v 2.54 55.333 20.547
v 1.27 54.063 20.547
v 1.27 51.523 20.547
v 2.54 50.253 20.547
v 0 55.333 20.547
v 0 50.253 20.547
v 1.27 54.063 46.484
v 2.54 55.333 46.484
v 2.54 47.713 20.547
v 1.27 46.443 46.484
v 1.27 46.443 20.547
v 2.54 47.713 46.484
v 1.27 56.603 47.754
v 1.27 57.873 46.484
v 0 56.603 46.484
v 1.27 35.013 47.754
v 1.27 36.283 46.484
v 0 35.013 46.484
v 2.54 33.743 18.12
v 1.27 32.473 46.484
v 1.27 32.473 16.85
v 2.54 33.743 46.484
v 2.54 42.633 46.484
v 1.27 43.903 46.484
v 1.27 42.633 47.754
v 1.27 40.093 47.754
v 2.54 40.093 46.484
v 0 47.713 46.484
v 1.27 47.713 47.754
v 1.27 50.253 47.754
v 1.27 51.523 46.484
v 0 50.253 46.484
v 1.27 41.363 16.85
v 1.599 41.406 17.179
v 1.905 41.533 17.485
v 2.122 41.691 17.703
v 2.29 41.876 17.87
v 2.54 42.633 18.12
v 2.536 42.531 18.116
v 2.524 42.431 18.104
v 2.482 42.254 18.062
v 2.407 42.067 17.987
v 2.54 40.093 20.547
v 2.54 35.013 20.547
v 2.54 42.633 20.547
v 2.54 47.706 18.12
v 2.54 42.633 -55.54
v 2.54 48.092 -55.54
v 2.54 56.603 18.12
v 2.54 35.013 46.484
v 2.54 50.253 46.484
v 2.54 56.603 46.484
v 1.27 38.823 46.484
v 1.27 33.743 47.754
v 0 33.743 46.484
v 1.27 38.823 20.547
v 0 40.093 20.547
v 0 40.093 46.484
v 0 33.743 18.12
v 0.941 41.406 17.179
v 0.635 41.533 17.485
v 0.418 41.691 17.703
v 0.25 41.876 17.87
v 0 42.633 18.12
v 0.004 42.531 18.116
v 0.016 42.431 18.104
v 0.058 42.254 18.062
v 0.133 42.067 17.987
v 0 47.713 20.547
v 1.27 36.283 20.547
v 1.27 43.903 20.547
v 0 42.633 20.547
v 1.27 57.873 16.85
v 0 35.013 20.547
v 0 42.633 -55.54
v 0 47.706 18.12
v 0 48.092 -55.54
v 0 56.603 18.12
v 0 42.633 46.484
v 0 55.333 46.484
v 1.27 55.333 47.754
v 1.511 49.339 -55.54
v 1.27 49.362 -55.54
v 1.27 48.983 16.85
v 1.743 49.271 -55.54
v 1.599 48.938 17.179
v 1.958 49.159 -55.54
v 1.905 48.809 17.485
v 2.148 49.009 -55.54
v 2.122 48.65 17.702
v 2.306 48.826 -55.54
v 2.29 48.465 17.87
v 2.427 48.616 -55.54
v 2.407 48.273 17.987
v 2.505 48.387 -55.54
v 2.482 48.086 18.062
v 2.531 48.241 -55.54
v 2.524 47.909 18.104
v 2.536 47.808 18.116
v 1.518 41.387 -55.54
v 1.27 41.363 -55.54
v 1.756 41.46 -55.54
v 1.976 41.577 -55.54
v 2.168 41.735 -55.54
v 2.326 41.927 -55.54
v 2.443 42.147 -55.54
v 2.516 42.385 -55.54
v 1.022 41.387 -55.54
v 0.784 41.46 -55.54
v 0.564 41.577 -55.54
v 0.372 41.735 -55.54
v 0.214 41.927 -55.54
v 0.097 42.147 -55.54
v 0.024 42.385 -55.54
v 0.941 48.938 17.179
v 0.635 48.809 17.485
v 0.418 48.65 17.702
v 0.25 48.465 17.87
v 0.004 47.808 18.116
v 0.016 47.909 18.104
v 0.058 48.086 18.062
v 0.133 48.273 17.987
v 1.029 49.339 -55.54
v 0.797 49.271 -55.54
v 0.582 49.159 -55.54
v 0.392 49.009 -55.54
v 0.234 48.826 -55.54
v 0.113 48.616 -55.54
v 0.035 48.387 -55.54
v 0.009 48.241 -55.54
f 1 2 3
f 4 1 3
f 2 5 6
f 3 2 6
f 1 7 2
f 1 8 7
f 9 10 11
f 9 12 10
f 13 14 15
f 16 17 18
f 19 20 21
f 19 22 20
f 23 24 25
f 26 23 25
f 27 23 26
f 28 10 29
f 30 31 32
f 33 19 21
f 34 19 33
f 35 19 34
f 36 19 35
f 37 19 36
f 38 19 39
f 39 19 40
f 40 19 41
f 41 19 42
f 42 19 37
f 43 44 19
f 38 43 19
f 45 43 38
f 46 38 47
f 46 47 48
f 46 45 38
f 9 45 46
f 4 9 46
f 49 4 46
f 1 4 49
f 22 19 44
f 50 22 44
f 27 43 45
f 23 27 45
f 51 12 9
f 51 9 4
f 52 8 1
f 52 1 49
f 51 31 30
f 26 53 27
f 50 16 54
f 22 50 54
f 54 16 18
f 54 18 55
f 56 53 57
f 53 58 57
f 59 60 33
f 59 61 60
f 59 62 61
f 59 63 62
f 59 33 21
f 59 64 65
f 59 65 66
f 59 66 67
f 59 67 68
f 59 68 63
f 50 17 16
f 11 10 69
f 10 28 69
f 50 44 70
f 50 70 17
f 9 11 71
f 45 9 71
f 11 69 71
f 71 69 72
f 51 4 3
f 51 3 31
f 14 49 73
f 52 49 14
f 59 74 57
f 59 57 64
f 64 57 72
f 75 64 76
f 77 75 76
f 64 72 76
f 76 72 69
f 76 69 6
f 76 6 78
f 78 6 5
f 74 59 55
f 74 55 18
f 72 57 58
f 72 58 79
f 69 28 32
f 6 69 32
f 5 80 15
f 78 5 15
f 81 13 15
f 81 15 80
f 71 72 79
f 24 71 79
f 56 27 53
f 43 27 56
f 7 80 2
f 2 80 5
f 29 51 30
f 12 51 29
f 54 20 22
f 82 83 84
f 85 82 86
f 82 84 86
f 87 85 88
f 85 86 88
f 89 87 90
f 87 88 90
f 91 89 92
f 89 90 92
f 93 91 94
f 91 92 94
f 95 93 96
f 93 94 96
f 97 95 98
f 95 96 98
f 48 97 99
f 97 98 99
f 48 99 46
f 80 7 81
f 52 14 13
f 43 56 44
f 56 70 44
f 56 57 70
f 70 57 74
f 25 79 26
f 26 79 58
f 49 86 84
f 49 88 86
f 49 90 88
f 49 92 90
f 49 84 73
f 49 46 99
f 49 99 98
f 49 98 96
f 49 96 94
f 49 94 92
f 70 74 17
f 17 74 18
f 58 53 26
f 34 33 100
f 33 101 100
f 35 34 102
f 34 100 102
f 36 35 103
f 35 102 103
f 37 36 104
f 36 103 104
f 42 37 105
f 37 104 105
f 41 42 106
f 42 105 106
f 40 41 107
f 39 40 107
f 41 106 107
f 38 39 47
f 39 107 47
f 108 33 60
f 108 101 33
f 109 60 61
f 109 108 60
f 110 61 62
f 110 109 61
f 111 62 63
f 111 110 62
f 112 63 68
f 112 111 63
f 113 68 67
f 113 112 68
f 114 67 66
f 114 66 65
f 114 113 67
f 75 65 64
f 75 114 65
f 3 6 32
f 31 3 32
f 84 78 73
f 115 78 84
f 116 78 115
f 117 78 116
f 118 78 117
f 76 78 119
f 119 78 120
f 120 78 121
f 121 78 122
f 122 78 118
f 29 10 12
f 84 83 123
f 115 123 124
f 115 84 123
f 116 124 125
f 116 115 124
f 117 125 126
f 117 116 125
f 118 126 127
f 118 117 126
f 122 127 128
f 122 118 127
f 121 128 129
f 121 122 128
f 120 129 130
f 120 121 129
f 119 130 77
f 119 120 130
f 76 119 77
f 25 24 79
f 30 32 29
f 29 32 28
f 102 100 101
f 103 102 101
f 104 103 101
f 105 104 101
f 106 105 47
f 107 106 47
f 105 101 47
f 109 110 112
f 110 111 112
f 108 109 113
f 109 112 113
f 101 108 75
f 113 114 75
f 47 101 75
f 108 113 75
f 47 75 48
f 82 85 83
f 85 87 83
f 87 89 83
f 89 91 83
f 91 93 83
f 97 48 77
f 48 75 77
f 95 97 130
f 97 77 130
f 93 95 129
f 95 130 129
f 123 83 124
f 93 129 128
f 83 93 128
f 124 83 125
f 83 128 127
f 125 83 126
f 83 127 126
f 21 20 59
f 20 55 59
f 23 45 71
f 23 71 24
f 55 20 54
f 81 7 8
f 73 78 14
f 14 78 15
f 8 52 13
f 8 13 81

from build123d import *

# Parameters (mm, degrees)
F1_DEPTH = 2.54
F2_R     = 1.26999
F3_SIZE  = 1.26999


# Not quite as in the source:
# - a fillet or chamfer is up to 0.001 mm smaller than in the source, because OpenCascade refuses the exact size


with BuildPart() as f1:
    # F0 (on Right) → F1 (new body)
    with BuildSketch(Plane.YZ):
        Polygon((41.3628902497, -55.5398087384), (48.9828902497, -55.5398087384), (49.3619268672, -55.5398087384), (48.9828902497, 16.8501912616), (57.8728902497, 16.8501912616), (57.8728902497, 20.5470483008), (57.8728902497, 47.7535999747), (54.0628902497, 47.7535999747), (54.0628902497, 20.5470483008), (51.5228902497, 20.5470483008), (51.5228902497, 47.7535999747), (46.4428902497, 47.7535999747), (46.4428902497, 20.5470483008), (43.9028902497, 20.5470483008), (43.9028902497, 47.7535999747), (38.8228902497, 47.7535999747), (38.8228902497, 20.5470483008), (36.2828902497, 20.5470483008), (36.2828902497, 47.7535999747), (32.4728902497, 47.7535999747), (32.4728902497, 16.8502441253), (41.3628902497, 16.8502441253), align=None)
    extrude(amount=F1_DEPTH)

    # F2 (radius 1.27 in the source; OpenCascade refuses exactly that, so slightly less here)
    f2_edges = [f1.edges().sort_by_distance(p)[0] for p in [
        (0, 49.172409, -19.344809),
        (2.54, 41.36289, -19.344782),
        (0, 41.36289, -19.344782),
        (2.54, 49.172409, -19.344809),
    ]]
    fillet(f2_edges, radius=F2_R)

    # F3 (size 1.27 in the source; OpenCascade refuses exactly that, so slightly less here)
    f3_edges = [f1.edges().sort_by_distance(p)[0] for p in [
        (0, 53.42789, 16.850191),
        (2.54, 53.42789, 16.850191),
        (0, 36.91789, 16.850244),
        (2.54, 36.91789, 16.850244),
        (0, 57.87289, 32.301896),
        (2.54, 57.87289, 32.301896),
        (2.54, 54.06289, 34.150324),
        (0, 54.06289, 34.150324),
        (2.54, 36.28289, 34.150324),
        (0, 36.28289, 34.150324),
        (2.54, 43.90289, 34.150324),
        (0, 43.90289, 34.150324),
        (2.54, 51.52289, 34.150324),
        (0, 51.52289, 34.150324),
        (2.54, 32.47289, 32.301922),
        (0, 32.47289, 32.301922),
        (2.54, 38.82289, 34.150324),
        (0, 38.82289, 34.150324),
        (2.54, 46.44289, 34.150324),
        (0, 46.44289, 34.150324),
        (1.27, 51.52289, 47.7536),
        (1.27, 46.44289, 47.7536),
        (0, 48.98289, 47.7536),
        (2.54, 48.98289, 47.7536),
        (1.27, 43.90289, 47.7536),
        (1.27, 38.82289, 47.7536),
        (0, 41.36289, 47.7536),
        (2.54, 41.36289, 47.7536),
        (1.27, 36.28289, 47.7536),
        (1.27, 32.47289, 47.7536),
        (0, 34.37789, 47.7536),
        (2.54, 34.37789, 47.7536),
        (1.27, 57.87289, 47.7536),
        (1.27, 54.06289, 47.7536),
        (0, 55.96789, 47.7536),
        (2.54, 55.96789, 47.7536),
    ]]
    chamfer(f3_edges, length=F3_SIZE)


solid = f1.part
